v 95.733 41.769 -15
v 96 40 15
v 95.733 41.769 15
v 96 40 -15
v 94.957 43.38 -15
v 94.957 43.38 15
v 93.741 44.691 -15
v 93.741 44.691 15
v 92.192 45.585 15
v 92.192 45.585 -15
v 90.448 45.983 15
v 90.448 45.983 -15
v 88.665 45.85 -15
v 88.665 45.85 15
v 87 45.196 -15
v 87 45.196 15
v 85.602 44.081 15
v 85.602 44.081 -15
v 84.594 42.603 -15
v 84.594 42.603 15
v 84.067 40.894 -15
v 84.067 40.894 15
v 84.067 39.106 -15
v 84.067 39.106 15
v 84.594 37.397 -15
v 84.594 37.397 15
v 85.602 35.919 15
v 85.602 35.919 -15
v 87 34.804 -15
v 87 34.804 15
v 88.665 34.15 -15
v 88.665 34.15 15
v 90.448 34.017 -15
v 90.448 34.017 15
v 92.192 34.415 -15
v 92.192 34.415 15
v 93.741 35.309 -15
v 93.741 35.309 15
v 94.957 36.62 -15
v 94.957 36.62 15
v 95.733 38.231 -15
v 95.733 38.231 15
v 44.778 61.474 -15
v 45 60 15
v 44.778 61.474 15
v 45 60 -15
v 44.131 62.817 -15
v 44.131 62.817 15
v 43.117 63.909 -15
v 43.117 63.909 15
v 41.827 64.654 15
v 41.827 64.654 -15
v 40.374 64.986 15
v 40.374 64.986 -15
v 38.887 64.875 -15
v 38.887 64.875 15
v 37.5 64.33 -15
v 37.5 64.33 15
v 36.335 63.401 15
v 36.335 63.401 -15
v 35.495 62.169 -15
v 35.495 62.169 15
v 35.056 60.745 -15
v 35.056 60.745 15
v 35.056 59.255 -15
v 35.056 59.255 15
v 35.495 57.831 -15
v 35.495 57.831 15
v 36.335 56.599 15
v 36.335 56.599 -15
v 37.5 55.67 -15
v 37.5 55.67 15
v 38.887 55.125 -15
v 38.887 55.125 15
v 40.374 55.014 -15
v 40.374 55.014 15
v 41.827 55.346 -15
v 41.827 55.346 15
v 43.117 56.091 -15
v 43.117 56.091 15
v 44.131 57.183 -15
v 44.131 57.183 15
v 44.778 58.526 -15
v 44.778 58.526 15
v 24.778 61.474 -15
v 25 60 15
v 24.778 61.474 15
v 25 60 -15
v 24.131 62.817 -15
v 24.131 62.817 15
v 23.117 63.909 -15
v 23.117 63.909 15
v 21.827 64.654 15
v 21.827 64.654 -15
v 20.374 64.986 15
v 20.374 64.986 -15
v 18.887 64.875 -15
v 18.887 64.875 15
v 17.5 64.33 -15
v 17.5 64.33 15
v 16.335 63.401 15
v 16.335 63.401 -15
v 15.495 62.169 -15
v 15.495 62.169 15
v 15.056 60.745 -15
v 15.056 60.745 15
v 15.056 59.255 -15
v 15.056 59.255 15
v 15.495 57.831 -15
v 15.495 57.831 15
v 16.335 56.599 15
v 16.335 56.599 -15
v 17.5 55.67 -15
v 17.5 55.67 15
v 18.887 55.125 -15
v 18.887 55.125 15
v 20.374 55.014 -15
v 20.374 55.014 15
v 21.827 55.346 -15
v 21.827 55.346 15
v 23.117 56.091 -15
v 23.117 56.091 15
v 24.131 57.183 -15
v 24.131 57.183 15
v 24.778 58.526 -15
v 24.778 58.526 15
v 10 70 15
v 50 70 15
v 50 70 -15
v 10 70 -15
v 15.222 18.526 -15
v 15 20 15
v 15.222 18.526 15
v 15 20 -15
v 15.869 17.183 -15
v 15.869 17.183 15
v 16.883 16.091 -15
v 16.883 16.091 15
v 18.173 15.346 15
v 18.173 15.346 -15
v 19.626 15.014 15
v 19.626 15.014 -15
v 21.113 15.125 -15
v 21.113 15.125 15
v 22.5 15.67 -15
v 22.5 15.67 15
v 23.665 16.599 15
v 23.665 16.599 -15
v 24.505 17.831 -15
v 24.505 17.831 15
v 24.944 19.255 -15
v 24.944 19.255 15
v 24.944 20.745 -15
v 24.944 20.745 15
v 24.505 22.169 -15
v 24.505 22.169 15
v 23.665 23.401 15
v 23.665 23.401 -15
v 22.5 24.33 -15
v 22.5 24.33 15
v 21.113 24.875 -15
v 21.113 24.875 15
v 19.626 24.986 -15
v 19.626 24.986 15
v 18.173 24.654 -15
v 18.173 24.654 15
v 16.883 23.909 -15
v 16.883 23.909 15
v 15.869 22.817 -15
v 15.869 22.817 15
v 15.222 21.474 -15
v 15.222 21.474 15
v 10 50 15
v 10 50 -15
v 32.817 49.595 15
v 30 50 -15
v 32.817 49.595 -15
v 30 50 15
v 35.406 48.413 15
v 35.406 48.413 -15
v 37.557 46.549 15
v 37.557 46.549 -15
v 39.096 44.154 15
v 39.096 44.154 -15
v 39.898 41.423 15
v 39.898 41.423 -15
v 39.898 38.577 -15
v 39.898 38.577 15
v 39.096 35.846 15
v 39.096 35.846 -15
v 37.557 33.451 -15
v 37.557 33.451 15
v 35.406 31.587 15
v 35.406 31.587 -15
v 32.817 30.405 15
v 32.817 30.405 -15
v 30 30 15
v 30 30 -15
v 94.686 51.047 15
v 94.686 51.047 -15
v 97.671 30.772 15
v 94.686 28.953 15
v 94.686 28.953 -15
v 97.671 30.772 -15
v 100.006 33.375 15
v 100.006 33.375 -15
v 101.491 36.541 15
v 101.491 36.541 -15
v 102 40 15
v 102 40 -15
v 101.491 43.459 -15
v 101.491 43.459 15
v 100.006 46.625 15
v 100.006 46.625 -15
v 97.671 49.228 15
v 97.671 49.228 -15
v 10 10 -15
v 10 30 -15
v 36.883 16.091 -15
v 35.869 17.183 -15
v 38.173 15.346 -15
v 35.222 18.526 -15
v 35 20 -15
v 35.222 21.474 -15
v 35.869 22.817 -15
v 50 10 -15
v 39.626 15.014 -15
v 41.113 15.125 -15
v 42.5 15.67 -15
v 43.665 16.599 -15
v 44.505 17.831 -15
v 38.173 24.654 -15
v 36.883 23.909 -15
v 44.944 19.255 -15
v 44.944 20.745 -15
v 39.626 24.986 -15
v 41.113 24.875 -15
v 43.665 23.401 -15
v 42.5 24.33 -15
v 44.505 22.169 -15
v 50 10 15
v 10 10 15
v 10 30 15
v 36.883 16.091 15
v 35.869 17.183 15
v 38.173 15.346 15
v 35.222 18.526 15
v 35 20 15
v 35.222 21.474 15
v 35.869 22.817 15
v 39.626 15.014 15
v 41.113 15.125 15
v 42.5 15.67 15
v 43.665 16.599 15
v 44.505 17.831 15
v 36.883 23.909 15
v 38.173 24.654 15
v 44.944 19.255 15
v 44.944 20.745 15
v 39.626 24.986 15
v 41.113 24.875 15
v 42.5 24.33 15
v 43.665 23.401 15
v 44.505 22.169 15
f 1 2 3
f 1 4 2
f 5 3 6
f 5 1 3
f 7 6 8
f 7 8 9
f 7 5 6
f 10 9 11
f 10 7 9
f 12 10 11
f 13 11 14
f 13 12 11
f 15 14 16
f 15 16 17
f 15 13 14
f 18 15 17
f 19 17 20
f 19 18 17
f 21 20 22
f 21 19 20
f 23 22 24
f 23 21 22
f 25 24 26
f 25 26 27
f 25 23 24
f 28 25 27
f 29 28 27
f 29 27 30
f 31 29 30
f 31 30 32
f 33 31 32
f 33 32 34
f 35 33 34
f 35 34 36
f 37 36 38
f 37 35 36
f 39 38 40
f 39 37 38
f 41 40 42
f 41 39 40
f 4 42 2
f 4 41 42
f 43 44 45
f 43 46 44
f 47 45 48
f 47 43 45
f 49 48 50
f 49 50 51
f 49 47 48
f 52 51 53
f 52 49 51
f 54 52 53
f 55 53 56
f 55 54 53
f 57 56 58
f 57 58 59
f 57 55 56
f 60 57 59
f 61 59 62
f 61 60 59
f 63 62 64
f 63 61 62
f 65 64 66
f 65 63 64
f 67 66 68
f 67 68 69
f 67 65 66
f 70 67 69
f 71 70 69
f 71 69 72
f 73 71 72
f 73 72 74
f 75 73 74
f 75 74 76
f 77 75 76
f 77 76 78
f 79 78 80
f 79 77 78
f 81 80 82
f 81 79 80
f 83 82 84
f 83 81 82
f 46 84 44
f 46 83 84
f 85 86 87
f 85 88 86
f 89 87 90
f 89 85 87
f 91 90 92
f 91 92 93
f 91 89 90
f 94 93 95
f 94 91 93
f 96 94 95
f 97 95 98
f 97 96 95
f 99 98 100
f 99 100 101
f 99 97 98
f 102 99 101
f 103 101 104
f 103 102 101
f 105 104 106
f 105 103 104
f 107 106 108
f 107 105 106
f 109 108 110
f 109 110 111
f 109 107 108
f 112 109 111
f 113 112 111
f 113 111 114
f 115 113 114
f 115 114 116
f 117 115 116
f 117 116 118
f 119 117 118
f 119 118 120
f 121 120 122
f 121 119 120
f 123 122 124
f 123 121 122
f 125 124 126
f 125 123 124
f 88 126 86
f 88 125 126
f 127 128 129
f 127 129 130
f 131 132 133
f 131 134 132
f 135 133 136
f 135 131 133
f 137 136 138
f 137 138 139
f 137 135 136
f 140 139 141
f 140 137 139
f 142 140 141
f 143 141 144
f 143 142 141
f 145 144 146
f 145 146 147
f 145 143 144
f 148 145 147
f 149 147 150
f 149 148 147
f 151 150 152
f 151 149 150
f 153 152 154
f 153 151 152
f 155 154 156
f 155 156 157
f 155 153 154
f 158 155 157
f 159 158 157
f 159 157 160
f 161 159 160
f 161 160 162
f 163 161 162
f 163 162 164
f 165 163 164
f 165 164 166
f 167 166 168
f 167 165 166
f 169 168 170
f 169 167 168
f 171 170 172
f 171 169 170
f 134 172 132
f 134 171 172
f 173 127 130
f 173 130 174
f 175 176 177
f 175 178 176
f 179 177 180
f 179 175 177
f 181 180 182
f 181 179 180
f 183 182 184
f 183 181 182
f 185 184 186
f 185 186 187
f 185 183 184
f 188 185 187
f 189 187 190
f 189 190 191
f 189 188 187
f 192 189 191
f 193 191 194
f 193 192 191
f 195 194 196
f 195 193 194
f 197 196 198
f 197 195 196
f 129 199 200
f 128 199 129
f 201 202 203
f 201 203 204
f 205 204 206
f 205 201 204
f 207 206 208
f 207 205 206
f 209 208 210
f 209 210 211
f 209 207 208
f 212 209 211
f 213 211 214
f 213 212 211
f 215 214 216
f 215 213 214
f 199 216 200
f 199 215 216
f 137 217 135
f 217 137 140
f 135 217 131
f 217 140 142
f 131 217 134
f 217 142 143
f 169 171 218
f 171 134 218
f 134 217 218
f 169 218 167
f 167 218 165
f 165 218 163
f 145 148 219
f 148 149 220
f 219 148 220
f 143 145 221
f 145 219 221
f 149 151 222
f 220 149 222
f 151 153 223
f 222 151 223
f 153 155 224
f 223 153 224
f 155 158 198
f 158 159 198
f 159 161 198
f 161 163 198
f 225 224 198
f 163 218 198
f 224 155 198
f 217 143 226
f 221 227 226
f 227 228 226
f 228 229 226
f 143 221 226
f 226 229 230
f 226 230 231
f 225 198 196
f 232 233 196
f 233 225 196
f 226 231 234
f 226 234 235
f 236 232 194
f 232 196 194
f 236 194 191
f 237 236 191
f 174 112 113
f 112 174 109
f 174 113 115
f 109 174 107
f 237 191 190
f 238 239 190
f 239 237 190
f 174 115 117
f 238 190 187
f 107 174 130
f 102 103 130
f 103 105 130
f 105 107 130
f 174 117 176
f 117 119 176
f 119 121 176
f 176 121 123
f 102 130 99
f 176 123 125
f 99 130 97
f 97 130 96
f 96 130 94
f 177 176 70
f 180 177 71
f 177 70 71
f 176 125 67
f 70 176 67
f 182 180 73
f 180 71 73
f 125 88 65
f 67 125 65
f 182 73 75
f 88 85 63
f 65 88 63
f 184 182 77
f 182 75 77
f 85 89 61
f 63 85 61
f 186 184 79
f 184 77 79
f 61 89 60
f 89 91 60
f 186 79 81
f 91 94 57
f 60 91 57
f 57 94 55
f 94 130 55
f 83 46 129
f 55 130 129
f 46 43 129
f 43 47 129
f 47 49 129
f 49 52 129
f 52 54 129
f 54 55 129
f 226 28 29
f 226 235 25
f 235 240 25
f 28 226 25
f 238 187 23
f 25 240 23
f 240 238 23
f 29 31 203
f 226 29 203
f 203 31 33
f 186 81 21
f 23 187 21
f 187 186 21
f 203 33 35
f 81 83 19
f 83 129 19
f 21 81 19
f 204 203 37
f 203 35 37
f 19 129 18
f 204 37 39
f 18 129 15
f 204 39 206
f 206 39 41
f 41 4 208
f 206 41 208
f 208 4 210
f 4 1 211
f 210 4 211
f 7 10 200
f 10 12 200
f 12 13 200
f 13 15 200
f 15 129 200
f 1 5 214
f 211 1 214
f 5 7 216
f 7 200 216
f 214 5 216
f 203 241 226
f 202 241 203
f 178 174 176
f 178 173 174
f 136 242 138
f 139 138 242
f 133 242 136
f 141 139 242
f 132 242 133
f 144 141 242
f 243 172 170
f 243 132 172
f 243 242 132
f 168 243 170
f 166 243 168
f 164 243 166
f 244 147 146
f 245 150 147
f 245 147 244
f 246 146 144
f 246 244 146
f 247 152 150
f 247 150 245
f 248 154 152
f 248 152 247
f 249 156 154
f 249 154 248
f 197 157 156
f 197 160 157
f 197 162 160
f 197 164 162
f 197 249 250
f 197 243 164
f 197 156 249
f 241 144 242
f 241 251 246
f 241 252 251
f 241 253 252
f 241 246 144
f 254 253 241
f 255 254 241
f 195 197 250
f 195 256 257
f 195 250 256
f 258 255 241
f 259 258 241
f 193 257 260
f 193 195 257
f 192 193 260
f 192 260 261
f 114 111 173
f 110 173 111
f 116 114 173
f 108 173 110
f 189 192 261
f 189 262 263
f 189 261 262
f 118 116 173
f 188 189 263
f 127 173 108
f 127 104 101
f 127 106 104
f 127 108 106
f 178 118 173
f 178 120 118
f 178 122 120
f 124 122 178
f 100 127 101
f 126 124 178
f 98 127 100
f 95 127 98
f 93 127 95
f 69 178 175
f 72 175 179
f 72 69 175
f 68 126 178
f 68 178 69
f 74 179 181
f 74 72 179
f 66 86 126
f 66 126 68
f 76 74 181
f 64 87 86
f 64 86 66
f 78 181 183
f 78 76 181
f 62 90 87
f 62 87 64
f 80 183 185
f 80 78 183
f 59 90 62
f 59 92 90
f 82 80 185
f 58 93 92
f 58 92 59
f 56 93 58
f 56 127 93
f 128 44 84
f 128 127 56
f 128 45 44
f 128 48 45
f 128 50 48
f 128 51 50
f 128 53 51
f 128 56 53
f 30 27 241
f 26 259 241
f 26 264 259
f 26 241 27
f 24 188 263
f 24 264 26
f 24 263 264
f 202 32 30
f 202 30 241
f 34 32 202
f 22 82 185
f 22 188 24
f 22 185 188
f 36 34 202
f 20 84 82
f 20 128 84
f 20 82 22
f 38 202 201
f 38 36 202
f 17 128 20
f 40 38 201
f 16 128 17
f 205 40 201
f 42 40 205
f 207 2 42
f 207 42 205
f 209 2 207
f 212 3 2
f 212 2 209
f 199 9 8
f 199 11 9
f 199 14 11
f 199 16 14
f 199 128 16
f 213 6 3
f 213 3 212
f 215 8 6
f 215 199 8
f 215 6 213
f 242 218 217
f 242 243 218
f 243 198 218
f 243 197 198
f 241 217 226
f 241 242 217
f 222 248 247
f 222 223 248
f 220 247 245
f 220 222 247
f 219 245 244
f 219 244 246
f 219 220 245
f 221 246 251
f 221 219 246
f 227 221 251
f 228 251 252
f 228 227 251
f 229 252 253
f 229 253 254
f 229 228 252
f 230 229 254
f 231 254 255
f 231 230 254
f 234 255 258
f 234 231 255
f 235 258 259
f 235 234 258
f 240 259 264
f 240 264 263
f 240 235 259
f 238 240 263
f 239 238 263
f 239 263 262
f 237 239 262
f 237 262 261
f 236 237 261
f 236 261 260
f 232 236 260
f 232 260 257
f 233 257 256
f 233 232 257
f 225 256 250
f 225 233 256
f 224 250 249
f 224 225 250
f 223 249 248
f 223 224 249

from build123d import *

# Parameters (mm, degrees)
SKETCH1_R           = 5
SKETCH1_R_2         = 6
BOSS_EXTRUDE2_DEPTH = 15


with BuildPart() as part:
    # Sketch1 → Boss-Extrude2 (new, symmetric)
    with BuildSketch(Plane.XY):
        with BuildLine():
            Line((10, 10), (50, 10))
            Line((50, 10), (94.685564793, 28.952580276))
            ThreePointArc((94.685564793, 28.952580276), (102, 40), (94.685564793, 51.047419724))
            Line((94.685564793, 51.047419724), (50, 70))
            Line((50, 70), (10, 70))
            Line((10, 70), (10, 50))
            Line((10, 50), (30, 50))
            ThreePointArc((30, 50), (40, 40), (30, 30))
            Line((30, 30), (10, 30))
            Line((10, 30), (10, 10))
        make_face()
        with Locations((20, 60)):
            Circle(SKETCH1_R, mode=Mode.SUBTRACT)
        with Locations((40, 60)):
            Circle(SKETCH1_R, mode=Mode.SUBTRACT)
        with Locations((90, 40)):
            Circle(SKETCH1_R_2, mode=Mode.SUBTRACT)
        with Locations(Location((40, 20, 0), (0, 0, 180))):
            Circle(SKETCH1_R, mode=Mode.SUBTRACT)
        with Locations(Location((20, 20, 0), (0, 0, 180))):
            Circle(SKETCH1_R, mode=Mode.SUBTRACT)
    extrude(amount=BOSS_EXTRUDE2_DEPTH, both=True)


solid = part.part
